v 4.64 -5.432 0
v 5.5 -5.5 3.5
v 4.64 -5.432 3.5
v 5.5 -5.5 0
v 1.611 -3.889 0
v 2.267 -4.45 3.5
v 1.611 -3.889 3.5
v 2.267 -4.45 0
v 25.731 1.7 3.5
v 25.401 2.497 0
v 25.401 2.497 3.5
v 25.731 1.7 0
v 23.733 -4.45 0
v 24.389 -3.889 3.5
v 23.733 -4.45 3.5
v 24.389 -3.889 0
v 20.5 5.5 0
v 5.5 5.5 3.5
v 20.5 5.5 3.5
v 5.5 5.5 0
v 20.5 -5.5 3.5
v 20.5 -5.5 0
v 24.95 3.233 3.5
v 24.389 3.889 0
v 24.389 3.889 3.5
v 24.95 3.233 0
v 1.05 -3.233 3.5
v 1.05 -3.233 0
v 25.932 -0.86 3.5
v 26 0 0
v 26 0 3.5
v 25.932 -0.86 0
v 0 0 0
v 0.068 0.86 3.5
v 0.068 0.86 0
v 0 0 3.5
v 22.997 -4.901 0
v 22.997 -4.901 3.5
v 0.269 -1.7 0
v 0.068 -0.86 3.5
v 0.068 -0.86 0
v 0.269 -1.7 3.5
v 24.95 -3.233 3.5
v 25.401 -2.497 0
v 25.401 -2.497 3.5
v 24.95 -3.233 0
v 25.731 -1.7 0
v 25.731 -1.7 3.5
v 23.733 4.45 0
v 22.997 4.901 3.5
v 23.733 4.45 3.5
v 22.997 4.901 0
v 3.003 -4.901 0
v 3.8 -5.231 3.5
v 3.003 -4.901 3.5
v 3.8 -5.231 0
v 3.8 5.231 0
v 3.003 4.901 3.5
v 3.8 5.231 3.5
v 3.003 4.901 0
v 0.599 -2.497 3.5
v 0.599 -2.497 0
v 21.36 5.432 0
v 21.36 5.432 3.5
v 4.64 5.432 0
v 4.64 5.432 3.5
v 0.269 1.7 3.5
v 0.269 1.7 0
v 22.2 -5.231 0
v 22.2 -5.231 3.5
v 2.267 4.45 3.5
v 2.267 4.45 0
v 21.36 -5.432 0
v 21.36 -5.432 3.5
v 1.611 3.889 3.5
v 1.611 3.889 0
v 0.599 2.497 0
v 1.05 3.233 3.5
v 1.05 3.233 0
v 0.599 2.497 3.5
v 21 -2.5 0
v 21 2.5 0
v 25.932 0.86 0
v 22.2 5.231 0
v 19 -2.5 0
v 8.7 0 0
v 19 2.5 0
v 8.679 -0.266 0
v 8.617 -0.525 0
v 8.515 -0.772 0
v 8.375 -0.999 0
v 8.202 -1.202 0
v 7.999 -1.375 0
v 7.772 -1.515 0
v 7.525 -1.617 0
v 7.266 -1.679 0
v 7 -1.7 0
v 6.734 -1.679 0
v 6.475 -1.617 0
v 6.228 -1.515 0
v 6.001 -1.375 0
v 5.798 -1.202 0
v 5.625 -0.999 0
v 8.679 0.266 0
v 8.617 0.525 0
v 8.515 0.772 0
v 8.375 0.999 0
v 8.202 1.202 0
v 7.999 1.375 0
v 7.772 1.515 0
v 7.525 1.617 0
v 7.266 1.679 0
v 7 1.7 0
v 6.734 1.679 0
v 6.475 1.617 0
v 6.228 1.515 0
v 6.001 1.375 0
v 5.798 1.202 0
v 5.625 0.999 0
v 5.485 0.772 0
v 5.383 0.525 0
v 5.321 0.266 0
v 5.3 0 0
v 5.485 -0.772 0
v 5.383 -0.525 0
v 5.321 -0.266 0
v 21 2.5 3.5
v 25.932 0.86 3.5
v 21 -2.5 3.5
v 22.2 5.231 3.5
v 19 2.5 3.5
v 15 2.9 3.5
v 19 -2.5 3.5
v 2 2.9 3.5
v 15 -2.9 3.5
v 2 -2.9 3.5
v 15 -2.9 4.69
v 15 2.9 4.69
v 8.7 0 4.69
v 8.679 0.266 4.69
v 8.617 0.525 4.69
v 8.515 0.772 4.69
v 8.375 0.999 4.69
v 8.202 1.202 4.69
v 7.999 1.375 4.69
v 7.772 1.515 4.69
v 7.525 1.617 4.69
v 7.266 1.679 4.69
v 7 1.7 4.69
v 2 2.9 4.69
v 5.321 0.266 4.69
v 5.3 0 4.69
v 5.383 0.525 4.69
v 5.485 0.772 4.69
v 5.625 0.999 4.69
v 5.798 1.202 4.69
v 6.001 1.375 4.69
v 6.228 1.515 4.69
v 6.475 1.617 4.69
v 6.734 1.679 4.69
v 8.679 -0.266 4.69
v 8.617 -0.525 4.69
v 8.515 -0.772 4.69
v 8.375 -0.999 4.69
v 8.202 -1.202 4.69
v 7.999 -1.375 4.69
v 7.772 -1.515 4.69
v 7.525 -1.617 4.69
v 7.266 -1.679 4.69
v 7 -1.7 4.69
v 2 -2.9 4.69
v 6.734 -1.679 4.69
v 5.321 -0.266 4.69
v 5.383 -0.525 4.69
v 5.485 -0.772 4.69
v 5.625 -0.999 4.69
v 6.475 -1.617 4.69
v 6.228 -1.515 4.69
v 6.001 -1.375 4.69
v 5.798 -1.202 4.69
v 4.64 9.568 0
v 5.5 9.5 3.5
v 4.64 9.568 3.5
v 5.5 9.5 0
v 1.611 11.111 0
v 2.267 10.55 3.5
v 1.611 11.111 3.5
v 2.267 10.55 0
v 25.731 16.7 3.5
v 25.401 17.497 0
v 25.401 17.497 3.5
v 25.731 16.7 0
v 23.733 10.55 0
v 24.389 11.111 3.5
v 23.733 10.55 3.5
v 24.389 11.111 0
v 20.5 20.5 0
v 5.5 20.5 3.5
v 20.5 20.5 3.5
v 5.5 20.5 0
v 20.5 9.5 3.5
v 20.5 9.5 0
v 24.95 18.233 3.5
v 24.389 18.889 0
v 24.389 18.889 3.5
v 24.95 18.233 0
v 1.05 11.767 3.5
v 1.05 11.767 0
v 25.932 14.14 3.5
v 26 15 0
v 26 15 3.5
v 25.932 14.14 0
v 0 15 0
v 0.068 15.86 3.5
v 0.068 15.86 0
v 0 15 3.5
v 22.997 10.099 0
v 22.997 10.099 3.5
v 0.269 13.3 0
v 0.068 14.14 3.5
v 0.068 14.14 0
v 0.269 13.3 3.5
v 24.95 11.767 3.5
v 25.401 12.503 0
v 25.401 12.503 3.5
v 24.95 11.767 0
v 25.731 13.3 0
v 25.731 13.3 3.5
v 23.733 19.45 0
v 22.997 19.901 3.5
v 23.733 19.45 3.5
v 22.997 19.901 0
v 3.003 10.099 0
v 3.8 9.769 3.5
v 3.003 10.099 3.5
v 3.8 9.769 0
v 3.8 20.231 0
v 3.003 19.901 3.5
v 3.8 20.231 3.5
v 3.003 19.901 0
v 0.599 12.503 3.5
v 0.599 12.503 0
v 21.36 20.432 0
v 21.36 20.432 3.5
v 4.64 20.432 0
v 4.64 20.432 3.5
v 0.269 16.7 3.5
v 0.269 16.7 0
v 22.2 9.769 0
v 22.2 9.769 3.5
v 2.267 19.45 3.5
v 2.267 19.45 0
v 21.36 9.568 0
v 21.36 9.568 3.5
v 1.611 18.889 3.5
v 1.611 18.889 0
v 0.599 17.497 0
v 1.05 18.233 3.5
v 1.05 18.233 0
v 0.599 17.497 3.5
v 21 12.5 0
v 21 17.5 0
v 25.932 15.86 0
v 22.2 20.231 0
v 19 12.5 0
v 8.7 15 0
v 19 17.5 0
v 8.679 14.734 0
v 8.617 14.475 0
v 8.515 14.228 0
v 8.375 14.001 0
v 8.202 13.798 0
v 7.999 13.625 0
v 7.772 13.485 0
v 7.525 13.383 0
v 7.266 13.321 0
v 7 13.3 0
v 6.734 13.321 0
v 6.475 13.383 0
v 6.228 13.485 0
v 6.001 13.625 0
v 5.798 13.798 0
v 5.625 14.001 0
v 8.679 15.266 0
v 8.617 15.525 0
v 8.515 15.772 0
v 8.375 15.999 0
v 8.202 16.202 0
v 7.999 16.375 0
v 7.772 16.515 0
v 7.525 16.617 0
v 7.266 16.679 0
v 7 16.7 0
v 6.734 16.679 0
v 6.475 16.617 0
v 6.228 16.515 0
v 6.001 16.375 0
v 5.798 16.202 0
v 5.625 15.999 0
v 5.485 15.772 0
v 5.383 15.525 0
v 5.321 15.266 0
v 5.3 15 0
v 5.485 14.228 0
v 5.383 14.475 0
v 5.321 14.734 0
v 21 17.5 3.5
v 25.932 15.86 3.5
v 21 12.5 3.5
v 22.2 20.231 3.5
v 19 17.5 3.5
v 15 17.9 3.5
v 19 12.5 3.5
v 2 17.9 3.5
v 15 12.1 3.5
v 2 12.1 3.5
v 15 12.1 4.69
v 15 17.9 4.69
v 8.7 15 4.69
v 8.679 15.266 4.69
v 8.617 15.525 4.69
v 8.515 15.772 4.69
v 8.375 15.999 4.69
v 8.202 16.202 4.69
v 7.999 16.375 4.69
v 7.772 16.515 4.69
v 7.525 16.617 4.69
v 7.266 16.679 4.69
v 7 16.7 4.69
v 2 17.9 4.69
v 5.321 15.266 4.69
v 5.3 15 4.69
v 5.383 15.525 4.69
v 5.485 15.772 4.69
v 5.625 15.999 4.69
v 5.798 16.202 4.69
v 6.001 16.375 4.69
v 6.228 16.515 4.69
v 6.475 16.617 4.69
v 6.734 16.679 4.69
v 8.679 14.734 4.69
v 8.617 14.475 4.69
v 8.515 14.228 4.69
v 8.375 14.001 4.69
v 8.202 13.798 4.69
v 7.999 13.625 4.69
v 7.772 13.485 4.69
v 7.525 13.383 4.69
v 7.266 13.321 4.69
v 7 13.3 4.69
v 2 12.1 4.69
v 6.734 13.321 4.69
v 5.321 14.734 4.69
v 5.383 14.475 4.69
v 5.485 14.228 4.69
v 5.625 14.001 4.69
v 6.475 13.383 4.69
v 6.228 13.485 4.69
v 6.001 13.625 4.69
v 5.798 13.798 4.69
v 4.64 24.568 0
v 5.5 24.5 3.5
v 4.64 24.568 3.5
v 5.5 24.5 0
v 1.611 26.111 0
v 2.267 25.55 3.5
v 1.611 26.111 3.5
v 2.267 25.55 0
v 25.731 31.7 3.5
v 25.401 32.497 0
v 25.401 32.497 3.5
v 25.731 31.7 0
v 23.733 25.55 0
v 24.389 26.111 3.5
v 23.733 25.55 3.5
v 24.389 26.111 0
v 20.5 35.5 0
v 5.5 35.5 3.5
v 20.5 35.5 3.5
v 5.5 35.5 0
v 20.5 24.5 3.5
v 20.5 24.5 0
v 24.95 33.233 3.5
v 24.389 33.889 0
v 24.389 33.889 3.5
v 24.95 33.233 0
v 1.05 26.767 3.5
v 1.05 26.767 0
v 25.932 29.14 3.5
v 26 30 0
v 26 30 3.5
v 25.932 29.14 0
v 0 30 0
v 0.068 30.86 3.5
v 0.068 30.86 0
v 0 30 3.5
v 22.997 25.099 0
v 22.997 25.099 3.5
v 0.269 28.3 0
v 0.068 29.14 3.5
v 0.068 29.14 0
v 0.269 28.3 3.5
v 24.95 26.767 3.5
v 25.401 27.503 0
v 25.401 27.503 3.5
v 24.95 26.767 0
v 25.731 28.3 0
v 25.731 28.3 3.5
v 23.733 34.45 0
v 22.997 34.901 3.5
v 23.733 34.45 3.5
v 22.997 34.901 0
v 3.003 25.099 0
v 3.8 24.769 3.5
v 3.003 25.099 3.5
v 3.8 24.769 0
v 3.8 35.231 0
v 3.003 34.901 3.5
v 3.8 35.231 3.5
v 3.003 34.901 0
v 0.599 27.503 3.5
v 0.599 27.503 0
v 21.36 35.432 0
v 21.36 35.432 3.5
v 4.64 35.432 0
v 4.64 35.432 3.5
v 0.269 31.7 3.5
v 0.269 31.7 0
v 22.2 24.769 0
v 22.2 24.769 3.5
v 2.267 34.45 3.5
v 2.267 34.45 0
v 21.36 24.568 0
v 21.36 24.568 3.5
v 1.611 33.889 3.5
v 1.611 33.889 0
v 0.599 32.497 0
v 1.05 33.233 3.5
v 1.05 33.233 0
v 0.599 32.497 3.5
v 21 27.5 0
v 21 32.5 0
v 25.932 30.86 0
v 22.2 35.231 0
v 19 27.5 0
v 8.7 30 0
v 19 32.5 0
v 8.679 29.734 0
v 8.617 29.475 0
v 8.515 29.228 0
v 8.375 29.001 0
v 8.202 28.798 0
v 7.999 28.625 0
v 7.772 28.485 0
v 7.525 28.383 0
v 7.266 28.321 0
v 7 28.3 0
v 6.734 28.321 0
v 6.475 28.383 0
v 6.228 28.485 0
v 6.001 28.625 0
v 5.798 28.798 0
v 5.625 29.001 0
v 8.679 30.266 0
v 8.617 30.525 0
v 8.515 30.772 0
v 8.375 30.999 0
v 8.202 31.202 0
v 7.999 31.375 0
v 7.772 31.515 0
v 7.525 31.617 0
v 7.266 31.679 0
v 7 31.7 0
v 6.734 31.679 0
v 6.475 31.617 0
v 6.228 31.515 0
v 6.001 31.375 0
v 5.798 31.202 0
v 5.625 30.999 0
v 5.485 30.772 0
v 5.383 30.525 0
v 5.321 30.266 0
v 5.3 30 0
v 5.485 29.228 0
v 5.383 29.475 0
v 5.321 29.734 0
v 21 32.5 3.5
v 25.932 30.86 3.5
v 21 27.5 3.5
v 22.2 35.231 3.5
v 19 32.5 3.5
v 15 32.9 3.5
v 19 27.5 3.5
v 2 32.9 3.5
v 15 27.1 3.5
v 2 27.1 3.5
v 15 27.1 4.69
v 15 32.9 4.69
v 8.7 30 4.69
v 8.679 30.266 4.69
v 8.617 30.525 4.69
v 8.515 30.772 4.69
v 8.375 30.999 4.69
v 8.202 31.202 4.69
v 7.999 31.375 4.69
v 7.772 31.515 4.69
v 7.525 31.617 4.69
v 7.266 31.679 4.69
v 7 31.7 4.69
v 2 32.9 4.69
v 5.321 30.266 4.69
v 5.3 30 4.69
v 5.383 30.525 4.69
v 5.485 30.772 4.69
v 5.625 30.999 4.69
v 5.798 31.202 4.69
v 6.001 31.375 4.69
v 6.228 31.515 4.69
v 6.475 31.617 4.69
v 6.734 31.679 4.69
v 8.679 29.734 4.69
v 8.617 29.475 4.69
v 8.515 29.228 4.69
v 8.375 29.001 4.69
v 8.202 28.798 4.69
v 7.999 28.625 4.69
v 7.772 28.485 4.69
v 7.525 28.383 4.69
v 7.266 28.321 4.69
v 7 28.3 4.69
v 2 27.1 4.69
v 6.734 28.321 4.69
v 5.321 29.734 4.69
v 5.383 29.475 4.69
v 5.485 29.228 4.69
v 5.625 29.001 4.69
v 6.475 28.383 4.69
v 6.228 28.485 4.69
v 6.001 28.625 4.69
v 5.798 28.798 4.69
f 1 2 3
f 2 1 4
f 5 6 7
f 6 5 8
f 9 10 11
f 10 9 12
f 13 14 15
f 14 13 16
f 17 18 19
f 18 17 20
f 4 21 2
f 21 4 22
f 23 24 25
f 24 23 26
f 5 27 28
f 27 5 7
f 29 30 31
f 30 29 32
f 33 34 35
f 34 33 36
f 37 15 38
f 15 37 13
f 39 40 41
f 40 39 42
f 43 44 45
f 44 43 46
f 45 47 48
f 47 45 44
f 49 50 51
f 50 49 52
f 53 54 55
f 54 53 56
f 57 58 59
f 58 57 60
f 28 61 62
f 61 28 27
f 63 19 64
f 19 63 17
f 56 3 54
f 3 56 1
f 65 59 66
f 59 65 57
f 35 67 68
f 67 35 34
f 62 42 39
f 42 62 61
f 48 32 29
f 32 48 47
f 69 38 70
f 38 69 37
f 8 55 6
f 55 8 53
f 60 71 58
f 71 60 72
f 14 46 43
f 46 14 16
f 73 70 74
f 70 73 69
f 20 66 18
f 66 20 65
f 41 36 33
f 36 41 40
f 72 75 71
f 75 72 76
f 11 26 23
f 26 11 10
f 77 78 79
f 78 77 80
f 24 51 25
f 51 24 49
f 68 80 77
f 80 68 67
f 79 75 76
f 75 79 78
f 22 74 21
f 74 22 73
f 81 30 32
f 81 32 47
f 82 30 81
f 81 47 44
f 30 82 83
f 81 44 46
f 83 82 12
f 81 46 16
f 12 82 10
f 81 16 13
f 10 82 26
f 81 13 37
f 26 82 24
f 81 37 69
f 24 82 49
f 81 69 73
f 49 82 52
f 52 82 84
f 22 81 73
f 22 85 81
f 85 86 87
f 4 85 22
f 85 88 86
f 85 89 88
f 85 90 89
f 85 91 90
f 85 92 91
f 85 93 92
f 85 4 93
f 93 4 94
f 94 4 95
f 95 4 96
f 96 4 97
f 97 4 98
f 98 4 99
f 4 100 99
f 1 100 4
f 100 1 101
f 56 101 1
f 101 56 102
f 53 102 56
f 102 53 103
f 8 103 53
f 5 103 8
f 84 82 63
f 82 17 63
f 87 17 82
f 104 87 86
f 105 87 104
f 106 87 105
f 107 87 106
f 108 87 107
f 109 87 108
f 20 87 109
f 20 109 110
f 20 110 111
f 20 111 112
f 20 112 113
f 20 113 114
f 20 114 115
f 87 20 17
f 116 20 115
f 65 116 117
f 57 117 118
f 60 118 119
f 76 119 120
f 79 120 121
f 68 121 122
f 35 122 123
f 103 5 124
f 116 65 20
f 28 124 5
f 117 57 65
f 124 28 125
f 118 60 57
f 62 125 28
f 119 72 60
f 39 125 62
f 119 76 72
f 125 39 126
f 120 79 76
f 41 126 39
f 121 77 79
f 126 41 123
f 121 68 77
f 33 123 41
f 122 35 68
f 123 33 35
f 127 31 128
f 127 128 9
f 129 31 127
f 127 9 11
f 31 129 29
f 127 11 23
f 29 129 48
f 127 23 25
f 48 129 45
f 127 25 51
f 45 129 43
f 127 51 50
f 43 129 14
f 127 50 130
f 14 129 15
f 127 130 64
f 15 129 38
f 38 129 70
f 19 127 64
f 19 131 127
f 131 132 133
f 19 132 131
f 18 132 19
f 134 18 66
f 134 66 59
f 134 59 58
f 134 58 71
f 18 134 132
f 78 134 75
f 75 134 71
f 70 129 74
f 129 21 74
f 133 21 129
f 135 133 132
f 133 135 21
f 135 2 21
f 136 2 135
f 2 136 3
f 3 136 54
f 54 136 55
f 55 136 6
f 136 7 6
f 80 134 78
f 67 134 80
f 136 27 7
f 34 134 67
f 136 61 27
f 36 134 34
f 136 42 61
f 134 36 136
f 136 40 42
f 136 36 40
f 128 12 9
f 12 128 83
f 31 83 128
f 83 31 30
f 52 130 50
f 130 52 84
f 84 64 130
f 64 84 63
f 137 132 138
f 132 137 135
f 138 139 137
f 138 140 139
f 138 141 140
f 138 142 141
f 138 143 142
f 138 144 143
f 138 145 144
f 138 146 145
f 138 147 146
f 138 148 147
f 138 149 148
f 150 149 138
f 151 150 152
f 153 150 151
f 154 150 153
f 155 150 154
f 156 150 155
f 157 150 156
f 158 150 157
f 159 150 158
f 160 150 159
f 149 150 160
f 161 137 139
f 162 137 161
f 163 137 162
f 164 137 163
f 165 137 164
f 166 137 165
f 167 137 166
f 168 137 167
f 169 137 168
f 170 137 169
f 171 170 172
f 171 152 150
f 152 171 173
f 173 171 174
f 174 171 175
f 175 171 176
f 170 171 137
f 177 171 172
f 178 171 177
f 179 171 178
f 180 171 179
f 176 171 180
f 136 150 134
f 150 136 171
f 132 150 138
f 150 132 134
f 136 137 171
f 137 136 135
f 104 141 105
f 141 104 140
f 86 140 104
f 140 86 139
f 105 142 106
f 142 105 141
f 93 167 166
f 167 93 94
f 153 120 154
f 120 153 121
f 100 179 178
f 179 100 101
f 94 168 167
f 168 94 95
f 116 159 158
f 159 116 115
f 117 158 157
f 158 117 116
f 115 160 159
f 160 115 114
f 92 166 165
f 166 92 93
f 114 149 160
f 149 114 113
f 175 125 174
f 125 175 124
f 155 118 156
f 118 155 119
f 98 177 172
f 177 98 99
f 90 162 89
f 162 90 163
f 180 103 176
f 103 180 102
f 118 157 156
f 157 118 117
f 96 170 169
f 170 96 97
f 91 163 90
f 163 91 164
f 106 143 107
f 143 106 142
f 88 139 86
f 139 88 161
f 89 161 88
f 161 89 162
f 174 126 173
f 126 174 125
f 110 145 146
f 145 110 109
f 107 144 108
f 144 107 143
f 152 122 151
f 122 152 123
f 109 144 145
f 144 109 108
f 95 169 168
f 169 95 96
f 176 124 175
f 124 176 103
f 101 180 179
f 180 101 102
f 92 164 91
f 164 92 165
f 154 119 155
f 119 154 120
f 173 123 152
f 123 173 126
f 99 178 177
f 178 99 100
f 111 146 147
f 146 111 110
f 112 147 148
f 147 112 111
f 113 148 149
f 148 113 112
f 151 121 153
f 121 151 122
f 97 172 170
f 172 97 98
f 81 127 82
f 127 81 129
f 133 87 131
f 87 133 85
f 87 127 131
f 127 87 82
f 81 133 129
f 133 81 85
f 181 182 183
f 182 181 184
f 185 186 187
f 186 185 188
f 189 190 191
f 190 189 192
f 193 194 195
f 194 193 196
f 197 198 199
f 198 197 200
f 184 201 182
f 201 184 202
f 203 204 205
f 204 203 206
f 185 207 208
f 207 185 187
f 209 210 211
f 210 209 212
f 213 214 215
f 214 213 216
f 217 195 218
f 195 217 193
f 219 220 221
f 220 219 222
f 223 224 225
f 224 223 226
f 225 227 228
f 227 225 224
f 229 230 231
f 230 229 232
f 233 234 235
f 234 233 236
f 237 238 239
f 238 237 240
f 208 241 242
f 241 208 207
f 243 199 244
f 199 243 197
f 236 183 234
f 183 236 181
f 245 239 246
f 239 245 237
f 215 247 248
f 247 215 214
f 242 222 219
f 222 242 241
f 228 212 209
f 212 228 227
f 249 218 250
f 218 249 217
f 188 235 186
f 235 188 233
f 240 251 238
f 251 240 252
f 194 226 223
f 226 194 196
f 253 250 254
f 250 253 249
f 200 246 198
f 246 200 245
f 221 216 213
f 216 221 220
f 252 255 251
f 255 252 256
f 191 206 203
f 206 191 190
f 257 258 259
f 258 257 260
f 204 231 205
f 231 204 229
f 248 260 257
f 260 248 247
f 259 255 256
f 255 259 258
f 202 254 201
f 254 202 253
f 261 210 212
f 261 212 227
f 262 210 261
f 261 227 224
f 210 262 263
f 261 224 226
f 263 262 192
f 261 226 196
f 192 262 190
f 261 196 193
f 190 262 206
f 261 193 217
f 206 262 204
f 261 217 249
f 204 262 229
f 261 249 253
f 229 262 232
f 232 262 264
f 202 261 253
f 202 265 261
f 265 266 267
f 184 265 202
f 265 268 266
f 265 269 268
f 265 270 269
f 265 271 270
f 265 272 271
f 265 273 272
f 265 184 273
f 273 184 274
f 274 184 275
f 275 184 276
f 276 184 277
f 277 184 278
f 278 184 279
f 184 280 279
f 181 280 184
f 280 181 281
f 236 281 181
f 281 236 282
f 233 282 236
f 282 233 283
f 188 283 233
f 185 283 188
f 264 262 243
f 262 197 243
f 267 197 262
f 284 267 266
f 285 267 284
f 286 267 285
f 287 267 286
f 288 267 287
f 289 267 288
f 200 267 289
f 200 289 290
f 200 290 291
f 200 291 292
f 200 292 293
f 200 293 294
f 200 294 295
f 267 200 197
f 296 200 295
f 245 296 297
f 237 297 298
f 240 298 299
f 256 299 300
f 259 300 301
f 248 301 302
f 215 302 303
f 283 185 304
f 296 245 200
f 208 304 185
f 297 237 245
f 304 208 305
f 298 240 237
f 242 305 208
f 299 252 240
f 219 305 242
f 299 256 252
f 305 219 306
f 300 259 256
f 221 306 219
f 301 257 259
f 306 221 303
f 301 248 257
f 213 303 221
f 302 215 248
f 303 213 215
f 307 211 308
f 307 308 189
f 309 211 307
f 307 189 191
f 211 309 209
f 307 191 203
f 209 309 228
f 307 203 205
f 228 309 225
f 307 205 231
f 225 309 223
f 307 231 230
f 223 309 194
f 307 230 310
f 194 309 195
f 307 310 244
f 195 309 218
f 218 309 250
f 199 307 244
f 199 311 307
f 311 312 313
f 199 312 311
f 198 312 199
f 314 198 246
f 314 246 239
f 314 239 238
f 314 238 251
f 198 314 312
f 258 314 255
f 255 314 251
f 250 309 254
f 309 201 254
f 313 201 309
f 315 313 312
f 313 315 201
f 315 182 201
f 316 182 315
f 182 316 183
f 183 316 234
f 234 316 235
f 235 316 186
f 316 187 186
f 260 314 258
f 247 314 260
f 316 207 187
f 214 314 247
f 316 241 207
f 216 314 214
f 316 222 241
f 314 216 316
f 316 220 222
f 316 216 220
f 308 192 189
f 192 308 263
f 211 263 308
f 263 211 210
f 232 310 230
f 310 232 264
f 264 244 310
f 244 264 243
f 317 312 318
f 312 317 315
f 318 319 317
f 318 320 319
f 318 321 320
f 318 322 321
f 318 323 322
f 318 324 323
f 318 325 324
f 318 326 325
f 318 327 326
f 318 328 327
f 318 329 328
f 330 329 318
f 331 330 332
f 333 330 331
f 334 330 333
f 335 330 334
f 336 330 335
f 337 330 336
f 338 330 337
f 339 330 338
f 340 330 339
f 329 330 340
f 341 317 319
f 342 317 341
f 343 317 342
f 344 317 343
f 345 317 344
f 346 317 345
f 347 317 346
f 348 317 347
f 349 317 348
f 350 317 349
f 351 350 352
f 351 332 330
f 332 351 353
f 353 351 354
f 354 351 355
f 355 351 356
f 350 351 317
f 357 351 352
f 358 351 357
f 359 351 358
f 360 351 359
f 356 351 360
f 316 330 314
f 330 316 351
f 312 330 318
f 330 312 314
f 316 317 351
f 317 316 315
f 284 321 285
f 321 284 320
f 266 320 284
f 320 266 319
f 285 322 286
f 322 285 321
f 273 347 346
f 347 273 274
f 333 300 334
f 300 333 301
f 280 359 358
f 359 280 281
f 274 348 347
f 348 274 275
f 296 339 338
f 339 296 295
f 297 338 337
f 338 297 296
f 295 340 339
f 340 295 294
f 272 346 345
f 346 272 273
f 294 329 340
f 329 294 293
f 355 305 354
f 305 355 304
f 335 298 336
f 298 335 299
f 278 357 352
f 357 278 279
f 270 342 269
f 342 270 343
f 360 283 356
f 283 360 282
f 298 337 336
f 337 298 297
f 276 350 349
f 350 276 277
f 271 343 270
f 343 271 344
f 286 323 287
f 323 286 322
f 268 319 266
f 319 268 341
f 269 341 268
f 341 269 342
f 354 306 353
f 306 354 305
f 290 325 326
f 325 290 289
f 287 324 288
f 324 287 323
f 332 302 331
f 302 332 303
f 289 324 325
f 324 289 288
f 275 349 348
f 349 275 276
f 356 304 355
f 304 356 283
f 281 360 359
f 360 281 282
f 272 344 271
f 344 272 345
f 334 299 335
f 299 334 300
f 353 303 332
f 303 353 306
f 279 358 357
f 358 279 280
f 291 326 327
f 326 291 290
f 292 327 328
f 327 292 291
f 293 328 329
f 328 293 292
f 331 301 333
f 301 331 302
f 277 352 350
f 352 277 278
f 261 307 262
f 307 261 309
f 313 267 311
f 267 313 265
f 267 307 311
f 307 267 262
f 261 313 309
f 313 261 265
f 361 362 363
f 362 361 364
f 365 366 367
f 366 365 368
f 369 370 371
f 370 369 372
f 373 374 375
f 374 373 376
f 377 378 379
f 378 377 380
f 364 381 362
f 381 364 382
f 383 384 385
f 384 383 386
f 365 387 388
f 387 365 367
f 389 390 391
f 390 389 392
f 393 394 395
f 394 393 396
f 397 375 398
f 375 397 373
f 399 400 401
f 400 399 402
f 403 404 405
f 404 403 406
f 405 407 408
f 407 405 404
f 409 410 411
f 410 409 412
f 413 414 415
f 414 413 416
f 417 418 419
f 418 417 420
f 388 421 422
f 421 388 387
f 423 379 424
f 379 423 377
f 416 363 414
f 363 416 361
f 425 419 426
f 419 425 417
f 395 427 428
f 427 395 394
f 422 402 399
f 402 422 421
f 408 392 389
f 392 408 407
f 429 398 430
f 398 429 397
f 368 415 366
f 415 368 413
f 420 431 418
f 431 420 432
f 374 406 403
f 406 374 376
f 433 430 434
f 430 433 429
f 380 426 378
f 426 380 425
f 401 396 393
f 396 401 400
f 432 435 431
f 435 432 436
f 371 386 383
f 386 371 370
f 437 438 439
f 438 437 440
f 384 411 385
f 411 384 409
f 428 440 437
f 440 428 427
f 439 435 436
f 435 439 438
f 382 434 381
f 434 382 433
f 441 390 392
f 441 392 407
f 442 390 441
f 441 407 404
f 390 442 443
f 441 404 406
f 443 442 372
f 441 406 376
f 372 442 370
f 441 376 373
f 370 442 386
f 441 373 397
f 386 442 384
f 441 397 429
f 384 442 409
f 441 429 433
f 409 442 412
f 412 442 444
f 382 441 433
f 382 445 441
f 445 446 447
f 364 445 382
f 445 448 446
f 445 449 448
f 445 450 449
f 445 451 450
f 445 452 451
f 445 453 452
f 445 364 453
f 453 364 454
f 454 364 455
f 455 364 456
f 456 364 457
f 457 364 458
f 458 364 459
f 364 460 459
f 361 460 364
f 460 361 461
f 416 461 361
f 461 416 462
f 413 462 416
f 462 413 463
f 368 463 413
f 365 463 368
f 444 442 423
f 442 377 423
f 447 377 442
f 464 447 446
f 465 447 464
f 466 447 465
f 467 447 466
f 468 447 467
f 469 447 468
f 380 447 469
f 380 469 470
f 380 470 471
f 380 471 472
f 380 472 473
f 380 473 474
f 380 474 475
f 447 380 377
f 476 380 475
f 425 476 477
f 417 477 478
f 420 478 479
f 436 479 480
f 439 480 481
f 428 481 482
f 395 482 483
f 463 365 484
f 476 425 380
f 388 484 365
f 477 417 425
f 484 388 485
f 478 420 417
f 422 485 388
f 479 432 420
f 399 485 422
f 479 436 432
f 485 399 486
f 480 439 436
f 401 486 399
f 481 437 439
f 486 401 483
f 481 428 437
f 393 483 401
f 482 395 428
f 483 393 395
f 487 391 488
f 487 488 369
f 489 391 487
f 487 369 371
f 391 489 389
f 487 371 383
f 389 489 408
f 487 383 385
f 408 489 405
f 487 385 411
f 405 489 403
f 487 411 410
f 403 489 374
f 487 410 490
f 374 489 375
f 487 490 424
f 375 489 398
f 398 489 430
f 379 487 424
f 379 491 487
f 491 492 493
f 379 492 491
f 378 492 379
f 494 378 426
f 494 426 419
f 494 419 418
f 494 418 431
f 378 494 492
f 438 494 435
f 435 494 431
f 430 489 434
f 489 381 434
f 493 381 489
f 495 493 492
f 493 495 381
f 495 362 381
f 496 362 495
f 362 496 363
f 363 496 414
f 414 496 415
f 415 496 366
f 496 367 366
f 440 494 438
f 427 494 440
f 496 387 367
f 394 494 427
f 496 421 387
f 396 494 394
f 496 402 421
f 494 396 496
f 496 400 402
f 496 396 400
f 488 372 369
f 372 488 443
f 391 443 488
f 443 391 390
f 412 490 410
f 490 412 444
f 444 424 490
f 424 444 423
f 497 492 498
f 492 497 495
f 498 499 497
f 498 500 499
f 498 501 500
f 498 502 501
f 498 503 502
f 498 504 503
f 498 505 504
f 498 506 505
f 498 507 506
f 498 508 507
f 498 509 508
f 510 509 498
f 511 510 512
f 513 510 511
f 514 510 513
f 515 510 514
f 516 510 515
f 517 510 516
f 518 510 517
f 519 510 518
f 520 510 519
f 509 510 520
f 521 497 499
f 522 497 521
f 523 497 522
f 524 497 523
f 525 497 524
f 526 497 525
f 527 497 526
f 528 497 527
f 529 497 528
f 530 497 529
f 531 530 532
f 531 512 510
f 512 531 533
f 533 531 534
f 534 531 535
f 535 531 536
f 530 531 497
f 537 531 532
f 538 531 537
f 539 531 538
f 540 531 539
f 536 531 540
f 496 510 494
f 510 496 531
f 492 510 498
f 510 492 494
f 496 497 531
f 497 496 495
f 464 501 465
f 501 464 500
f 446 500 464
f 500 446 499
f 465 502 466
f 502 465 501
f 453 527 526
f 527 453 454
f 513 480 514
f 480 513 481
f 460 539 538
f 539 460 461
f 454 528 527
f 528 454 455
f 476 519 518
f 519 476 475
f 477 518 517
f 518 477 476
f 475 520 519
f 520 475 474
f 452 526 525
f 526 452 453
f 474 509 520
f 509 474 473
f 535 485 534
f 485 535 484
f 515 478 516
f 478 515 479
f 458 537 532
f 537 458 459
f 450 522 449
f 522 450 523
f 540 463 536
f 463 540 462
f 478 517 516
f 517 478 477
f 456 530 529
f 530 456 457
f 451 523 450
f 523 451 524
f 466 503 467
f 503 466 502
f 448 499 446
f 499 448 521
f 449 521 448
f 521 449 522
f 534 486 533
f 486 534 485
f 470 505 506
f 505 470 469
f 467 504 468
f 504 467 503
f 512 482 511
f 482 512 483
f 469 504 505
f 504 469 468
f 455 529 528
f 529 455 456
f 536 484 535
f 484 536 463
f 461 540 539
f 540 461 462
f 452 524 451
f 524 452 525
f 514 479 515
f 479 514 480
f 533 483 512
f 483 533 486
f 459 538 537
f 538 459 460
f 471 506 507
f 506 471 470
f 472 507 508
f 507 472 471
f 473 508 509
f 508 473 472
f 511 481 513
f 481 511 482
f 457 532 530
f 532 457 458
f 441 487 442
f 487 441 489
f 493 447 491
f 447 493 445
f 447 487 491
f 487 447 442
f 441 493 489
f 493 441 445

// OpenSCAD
// Zip-tie anchor for a 2020 T-slot face: one M3x10 into a drop-in T-nut, one slot for the tie.
// A key on the back sits in the slot so it can't spin. Prints flat, key up, no supports. Makes three.
len = 26; wid = 11; t = 3.5;
key_w = 5.8; key_h = 1.2;
slot = [2, 5];
$fn = 40; eps = 0.01;
module mount() {
  difference() {
    union() {
      hull() for (x = [wid/2, len - wid/2]) translate([x, 0, 0]) cylinder(d = wid, h = t);
      translate([2, -key_w/2, t - eps]) cube([len - 13, key_w, key_h]);
    }
    translate([7, 0, -eps]) cylinder(d = 3.4, h = t + key_h + 1);
    translate([len - 6 - slot[0]/2, -slot[1]/2, -eps]) cube([slot[0], slot[1], t + 2*eps]);
  }
}
for (i = [0:2]) translate([0, i*(wid + 4), 0]) mount();
